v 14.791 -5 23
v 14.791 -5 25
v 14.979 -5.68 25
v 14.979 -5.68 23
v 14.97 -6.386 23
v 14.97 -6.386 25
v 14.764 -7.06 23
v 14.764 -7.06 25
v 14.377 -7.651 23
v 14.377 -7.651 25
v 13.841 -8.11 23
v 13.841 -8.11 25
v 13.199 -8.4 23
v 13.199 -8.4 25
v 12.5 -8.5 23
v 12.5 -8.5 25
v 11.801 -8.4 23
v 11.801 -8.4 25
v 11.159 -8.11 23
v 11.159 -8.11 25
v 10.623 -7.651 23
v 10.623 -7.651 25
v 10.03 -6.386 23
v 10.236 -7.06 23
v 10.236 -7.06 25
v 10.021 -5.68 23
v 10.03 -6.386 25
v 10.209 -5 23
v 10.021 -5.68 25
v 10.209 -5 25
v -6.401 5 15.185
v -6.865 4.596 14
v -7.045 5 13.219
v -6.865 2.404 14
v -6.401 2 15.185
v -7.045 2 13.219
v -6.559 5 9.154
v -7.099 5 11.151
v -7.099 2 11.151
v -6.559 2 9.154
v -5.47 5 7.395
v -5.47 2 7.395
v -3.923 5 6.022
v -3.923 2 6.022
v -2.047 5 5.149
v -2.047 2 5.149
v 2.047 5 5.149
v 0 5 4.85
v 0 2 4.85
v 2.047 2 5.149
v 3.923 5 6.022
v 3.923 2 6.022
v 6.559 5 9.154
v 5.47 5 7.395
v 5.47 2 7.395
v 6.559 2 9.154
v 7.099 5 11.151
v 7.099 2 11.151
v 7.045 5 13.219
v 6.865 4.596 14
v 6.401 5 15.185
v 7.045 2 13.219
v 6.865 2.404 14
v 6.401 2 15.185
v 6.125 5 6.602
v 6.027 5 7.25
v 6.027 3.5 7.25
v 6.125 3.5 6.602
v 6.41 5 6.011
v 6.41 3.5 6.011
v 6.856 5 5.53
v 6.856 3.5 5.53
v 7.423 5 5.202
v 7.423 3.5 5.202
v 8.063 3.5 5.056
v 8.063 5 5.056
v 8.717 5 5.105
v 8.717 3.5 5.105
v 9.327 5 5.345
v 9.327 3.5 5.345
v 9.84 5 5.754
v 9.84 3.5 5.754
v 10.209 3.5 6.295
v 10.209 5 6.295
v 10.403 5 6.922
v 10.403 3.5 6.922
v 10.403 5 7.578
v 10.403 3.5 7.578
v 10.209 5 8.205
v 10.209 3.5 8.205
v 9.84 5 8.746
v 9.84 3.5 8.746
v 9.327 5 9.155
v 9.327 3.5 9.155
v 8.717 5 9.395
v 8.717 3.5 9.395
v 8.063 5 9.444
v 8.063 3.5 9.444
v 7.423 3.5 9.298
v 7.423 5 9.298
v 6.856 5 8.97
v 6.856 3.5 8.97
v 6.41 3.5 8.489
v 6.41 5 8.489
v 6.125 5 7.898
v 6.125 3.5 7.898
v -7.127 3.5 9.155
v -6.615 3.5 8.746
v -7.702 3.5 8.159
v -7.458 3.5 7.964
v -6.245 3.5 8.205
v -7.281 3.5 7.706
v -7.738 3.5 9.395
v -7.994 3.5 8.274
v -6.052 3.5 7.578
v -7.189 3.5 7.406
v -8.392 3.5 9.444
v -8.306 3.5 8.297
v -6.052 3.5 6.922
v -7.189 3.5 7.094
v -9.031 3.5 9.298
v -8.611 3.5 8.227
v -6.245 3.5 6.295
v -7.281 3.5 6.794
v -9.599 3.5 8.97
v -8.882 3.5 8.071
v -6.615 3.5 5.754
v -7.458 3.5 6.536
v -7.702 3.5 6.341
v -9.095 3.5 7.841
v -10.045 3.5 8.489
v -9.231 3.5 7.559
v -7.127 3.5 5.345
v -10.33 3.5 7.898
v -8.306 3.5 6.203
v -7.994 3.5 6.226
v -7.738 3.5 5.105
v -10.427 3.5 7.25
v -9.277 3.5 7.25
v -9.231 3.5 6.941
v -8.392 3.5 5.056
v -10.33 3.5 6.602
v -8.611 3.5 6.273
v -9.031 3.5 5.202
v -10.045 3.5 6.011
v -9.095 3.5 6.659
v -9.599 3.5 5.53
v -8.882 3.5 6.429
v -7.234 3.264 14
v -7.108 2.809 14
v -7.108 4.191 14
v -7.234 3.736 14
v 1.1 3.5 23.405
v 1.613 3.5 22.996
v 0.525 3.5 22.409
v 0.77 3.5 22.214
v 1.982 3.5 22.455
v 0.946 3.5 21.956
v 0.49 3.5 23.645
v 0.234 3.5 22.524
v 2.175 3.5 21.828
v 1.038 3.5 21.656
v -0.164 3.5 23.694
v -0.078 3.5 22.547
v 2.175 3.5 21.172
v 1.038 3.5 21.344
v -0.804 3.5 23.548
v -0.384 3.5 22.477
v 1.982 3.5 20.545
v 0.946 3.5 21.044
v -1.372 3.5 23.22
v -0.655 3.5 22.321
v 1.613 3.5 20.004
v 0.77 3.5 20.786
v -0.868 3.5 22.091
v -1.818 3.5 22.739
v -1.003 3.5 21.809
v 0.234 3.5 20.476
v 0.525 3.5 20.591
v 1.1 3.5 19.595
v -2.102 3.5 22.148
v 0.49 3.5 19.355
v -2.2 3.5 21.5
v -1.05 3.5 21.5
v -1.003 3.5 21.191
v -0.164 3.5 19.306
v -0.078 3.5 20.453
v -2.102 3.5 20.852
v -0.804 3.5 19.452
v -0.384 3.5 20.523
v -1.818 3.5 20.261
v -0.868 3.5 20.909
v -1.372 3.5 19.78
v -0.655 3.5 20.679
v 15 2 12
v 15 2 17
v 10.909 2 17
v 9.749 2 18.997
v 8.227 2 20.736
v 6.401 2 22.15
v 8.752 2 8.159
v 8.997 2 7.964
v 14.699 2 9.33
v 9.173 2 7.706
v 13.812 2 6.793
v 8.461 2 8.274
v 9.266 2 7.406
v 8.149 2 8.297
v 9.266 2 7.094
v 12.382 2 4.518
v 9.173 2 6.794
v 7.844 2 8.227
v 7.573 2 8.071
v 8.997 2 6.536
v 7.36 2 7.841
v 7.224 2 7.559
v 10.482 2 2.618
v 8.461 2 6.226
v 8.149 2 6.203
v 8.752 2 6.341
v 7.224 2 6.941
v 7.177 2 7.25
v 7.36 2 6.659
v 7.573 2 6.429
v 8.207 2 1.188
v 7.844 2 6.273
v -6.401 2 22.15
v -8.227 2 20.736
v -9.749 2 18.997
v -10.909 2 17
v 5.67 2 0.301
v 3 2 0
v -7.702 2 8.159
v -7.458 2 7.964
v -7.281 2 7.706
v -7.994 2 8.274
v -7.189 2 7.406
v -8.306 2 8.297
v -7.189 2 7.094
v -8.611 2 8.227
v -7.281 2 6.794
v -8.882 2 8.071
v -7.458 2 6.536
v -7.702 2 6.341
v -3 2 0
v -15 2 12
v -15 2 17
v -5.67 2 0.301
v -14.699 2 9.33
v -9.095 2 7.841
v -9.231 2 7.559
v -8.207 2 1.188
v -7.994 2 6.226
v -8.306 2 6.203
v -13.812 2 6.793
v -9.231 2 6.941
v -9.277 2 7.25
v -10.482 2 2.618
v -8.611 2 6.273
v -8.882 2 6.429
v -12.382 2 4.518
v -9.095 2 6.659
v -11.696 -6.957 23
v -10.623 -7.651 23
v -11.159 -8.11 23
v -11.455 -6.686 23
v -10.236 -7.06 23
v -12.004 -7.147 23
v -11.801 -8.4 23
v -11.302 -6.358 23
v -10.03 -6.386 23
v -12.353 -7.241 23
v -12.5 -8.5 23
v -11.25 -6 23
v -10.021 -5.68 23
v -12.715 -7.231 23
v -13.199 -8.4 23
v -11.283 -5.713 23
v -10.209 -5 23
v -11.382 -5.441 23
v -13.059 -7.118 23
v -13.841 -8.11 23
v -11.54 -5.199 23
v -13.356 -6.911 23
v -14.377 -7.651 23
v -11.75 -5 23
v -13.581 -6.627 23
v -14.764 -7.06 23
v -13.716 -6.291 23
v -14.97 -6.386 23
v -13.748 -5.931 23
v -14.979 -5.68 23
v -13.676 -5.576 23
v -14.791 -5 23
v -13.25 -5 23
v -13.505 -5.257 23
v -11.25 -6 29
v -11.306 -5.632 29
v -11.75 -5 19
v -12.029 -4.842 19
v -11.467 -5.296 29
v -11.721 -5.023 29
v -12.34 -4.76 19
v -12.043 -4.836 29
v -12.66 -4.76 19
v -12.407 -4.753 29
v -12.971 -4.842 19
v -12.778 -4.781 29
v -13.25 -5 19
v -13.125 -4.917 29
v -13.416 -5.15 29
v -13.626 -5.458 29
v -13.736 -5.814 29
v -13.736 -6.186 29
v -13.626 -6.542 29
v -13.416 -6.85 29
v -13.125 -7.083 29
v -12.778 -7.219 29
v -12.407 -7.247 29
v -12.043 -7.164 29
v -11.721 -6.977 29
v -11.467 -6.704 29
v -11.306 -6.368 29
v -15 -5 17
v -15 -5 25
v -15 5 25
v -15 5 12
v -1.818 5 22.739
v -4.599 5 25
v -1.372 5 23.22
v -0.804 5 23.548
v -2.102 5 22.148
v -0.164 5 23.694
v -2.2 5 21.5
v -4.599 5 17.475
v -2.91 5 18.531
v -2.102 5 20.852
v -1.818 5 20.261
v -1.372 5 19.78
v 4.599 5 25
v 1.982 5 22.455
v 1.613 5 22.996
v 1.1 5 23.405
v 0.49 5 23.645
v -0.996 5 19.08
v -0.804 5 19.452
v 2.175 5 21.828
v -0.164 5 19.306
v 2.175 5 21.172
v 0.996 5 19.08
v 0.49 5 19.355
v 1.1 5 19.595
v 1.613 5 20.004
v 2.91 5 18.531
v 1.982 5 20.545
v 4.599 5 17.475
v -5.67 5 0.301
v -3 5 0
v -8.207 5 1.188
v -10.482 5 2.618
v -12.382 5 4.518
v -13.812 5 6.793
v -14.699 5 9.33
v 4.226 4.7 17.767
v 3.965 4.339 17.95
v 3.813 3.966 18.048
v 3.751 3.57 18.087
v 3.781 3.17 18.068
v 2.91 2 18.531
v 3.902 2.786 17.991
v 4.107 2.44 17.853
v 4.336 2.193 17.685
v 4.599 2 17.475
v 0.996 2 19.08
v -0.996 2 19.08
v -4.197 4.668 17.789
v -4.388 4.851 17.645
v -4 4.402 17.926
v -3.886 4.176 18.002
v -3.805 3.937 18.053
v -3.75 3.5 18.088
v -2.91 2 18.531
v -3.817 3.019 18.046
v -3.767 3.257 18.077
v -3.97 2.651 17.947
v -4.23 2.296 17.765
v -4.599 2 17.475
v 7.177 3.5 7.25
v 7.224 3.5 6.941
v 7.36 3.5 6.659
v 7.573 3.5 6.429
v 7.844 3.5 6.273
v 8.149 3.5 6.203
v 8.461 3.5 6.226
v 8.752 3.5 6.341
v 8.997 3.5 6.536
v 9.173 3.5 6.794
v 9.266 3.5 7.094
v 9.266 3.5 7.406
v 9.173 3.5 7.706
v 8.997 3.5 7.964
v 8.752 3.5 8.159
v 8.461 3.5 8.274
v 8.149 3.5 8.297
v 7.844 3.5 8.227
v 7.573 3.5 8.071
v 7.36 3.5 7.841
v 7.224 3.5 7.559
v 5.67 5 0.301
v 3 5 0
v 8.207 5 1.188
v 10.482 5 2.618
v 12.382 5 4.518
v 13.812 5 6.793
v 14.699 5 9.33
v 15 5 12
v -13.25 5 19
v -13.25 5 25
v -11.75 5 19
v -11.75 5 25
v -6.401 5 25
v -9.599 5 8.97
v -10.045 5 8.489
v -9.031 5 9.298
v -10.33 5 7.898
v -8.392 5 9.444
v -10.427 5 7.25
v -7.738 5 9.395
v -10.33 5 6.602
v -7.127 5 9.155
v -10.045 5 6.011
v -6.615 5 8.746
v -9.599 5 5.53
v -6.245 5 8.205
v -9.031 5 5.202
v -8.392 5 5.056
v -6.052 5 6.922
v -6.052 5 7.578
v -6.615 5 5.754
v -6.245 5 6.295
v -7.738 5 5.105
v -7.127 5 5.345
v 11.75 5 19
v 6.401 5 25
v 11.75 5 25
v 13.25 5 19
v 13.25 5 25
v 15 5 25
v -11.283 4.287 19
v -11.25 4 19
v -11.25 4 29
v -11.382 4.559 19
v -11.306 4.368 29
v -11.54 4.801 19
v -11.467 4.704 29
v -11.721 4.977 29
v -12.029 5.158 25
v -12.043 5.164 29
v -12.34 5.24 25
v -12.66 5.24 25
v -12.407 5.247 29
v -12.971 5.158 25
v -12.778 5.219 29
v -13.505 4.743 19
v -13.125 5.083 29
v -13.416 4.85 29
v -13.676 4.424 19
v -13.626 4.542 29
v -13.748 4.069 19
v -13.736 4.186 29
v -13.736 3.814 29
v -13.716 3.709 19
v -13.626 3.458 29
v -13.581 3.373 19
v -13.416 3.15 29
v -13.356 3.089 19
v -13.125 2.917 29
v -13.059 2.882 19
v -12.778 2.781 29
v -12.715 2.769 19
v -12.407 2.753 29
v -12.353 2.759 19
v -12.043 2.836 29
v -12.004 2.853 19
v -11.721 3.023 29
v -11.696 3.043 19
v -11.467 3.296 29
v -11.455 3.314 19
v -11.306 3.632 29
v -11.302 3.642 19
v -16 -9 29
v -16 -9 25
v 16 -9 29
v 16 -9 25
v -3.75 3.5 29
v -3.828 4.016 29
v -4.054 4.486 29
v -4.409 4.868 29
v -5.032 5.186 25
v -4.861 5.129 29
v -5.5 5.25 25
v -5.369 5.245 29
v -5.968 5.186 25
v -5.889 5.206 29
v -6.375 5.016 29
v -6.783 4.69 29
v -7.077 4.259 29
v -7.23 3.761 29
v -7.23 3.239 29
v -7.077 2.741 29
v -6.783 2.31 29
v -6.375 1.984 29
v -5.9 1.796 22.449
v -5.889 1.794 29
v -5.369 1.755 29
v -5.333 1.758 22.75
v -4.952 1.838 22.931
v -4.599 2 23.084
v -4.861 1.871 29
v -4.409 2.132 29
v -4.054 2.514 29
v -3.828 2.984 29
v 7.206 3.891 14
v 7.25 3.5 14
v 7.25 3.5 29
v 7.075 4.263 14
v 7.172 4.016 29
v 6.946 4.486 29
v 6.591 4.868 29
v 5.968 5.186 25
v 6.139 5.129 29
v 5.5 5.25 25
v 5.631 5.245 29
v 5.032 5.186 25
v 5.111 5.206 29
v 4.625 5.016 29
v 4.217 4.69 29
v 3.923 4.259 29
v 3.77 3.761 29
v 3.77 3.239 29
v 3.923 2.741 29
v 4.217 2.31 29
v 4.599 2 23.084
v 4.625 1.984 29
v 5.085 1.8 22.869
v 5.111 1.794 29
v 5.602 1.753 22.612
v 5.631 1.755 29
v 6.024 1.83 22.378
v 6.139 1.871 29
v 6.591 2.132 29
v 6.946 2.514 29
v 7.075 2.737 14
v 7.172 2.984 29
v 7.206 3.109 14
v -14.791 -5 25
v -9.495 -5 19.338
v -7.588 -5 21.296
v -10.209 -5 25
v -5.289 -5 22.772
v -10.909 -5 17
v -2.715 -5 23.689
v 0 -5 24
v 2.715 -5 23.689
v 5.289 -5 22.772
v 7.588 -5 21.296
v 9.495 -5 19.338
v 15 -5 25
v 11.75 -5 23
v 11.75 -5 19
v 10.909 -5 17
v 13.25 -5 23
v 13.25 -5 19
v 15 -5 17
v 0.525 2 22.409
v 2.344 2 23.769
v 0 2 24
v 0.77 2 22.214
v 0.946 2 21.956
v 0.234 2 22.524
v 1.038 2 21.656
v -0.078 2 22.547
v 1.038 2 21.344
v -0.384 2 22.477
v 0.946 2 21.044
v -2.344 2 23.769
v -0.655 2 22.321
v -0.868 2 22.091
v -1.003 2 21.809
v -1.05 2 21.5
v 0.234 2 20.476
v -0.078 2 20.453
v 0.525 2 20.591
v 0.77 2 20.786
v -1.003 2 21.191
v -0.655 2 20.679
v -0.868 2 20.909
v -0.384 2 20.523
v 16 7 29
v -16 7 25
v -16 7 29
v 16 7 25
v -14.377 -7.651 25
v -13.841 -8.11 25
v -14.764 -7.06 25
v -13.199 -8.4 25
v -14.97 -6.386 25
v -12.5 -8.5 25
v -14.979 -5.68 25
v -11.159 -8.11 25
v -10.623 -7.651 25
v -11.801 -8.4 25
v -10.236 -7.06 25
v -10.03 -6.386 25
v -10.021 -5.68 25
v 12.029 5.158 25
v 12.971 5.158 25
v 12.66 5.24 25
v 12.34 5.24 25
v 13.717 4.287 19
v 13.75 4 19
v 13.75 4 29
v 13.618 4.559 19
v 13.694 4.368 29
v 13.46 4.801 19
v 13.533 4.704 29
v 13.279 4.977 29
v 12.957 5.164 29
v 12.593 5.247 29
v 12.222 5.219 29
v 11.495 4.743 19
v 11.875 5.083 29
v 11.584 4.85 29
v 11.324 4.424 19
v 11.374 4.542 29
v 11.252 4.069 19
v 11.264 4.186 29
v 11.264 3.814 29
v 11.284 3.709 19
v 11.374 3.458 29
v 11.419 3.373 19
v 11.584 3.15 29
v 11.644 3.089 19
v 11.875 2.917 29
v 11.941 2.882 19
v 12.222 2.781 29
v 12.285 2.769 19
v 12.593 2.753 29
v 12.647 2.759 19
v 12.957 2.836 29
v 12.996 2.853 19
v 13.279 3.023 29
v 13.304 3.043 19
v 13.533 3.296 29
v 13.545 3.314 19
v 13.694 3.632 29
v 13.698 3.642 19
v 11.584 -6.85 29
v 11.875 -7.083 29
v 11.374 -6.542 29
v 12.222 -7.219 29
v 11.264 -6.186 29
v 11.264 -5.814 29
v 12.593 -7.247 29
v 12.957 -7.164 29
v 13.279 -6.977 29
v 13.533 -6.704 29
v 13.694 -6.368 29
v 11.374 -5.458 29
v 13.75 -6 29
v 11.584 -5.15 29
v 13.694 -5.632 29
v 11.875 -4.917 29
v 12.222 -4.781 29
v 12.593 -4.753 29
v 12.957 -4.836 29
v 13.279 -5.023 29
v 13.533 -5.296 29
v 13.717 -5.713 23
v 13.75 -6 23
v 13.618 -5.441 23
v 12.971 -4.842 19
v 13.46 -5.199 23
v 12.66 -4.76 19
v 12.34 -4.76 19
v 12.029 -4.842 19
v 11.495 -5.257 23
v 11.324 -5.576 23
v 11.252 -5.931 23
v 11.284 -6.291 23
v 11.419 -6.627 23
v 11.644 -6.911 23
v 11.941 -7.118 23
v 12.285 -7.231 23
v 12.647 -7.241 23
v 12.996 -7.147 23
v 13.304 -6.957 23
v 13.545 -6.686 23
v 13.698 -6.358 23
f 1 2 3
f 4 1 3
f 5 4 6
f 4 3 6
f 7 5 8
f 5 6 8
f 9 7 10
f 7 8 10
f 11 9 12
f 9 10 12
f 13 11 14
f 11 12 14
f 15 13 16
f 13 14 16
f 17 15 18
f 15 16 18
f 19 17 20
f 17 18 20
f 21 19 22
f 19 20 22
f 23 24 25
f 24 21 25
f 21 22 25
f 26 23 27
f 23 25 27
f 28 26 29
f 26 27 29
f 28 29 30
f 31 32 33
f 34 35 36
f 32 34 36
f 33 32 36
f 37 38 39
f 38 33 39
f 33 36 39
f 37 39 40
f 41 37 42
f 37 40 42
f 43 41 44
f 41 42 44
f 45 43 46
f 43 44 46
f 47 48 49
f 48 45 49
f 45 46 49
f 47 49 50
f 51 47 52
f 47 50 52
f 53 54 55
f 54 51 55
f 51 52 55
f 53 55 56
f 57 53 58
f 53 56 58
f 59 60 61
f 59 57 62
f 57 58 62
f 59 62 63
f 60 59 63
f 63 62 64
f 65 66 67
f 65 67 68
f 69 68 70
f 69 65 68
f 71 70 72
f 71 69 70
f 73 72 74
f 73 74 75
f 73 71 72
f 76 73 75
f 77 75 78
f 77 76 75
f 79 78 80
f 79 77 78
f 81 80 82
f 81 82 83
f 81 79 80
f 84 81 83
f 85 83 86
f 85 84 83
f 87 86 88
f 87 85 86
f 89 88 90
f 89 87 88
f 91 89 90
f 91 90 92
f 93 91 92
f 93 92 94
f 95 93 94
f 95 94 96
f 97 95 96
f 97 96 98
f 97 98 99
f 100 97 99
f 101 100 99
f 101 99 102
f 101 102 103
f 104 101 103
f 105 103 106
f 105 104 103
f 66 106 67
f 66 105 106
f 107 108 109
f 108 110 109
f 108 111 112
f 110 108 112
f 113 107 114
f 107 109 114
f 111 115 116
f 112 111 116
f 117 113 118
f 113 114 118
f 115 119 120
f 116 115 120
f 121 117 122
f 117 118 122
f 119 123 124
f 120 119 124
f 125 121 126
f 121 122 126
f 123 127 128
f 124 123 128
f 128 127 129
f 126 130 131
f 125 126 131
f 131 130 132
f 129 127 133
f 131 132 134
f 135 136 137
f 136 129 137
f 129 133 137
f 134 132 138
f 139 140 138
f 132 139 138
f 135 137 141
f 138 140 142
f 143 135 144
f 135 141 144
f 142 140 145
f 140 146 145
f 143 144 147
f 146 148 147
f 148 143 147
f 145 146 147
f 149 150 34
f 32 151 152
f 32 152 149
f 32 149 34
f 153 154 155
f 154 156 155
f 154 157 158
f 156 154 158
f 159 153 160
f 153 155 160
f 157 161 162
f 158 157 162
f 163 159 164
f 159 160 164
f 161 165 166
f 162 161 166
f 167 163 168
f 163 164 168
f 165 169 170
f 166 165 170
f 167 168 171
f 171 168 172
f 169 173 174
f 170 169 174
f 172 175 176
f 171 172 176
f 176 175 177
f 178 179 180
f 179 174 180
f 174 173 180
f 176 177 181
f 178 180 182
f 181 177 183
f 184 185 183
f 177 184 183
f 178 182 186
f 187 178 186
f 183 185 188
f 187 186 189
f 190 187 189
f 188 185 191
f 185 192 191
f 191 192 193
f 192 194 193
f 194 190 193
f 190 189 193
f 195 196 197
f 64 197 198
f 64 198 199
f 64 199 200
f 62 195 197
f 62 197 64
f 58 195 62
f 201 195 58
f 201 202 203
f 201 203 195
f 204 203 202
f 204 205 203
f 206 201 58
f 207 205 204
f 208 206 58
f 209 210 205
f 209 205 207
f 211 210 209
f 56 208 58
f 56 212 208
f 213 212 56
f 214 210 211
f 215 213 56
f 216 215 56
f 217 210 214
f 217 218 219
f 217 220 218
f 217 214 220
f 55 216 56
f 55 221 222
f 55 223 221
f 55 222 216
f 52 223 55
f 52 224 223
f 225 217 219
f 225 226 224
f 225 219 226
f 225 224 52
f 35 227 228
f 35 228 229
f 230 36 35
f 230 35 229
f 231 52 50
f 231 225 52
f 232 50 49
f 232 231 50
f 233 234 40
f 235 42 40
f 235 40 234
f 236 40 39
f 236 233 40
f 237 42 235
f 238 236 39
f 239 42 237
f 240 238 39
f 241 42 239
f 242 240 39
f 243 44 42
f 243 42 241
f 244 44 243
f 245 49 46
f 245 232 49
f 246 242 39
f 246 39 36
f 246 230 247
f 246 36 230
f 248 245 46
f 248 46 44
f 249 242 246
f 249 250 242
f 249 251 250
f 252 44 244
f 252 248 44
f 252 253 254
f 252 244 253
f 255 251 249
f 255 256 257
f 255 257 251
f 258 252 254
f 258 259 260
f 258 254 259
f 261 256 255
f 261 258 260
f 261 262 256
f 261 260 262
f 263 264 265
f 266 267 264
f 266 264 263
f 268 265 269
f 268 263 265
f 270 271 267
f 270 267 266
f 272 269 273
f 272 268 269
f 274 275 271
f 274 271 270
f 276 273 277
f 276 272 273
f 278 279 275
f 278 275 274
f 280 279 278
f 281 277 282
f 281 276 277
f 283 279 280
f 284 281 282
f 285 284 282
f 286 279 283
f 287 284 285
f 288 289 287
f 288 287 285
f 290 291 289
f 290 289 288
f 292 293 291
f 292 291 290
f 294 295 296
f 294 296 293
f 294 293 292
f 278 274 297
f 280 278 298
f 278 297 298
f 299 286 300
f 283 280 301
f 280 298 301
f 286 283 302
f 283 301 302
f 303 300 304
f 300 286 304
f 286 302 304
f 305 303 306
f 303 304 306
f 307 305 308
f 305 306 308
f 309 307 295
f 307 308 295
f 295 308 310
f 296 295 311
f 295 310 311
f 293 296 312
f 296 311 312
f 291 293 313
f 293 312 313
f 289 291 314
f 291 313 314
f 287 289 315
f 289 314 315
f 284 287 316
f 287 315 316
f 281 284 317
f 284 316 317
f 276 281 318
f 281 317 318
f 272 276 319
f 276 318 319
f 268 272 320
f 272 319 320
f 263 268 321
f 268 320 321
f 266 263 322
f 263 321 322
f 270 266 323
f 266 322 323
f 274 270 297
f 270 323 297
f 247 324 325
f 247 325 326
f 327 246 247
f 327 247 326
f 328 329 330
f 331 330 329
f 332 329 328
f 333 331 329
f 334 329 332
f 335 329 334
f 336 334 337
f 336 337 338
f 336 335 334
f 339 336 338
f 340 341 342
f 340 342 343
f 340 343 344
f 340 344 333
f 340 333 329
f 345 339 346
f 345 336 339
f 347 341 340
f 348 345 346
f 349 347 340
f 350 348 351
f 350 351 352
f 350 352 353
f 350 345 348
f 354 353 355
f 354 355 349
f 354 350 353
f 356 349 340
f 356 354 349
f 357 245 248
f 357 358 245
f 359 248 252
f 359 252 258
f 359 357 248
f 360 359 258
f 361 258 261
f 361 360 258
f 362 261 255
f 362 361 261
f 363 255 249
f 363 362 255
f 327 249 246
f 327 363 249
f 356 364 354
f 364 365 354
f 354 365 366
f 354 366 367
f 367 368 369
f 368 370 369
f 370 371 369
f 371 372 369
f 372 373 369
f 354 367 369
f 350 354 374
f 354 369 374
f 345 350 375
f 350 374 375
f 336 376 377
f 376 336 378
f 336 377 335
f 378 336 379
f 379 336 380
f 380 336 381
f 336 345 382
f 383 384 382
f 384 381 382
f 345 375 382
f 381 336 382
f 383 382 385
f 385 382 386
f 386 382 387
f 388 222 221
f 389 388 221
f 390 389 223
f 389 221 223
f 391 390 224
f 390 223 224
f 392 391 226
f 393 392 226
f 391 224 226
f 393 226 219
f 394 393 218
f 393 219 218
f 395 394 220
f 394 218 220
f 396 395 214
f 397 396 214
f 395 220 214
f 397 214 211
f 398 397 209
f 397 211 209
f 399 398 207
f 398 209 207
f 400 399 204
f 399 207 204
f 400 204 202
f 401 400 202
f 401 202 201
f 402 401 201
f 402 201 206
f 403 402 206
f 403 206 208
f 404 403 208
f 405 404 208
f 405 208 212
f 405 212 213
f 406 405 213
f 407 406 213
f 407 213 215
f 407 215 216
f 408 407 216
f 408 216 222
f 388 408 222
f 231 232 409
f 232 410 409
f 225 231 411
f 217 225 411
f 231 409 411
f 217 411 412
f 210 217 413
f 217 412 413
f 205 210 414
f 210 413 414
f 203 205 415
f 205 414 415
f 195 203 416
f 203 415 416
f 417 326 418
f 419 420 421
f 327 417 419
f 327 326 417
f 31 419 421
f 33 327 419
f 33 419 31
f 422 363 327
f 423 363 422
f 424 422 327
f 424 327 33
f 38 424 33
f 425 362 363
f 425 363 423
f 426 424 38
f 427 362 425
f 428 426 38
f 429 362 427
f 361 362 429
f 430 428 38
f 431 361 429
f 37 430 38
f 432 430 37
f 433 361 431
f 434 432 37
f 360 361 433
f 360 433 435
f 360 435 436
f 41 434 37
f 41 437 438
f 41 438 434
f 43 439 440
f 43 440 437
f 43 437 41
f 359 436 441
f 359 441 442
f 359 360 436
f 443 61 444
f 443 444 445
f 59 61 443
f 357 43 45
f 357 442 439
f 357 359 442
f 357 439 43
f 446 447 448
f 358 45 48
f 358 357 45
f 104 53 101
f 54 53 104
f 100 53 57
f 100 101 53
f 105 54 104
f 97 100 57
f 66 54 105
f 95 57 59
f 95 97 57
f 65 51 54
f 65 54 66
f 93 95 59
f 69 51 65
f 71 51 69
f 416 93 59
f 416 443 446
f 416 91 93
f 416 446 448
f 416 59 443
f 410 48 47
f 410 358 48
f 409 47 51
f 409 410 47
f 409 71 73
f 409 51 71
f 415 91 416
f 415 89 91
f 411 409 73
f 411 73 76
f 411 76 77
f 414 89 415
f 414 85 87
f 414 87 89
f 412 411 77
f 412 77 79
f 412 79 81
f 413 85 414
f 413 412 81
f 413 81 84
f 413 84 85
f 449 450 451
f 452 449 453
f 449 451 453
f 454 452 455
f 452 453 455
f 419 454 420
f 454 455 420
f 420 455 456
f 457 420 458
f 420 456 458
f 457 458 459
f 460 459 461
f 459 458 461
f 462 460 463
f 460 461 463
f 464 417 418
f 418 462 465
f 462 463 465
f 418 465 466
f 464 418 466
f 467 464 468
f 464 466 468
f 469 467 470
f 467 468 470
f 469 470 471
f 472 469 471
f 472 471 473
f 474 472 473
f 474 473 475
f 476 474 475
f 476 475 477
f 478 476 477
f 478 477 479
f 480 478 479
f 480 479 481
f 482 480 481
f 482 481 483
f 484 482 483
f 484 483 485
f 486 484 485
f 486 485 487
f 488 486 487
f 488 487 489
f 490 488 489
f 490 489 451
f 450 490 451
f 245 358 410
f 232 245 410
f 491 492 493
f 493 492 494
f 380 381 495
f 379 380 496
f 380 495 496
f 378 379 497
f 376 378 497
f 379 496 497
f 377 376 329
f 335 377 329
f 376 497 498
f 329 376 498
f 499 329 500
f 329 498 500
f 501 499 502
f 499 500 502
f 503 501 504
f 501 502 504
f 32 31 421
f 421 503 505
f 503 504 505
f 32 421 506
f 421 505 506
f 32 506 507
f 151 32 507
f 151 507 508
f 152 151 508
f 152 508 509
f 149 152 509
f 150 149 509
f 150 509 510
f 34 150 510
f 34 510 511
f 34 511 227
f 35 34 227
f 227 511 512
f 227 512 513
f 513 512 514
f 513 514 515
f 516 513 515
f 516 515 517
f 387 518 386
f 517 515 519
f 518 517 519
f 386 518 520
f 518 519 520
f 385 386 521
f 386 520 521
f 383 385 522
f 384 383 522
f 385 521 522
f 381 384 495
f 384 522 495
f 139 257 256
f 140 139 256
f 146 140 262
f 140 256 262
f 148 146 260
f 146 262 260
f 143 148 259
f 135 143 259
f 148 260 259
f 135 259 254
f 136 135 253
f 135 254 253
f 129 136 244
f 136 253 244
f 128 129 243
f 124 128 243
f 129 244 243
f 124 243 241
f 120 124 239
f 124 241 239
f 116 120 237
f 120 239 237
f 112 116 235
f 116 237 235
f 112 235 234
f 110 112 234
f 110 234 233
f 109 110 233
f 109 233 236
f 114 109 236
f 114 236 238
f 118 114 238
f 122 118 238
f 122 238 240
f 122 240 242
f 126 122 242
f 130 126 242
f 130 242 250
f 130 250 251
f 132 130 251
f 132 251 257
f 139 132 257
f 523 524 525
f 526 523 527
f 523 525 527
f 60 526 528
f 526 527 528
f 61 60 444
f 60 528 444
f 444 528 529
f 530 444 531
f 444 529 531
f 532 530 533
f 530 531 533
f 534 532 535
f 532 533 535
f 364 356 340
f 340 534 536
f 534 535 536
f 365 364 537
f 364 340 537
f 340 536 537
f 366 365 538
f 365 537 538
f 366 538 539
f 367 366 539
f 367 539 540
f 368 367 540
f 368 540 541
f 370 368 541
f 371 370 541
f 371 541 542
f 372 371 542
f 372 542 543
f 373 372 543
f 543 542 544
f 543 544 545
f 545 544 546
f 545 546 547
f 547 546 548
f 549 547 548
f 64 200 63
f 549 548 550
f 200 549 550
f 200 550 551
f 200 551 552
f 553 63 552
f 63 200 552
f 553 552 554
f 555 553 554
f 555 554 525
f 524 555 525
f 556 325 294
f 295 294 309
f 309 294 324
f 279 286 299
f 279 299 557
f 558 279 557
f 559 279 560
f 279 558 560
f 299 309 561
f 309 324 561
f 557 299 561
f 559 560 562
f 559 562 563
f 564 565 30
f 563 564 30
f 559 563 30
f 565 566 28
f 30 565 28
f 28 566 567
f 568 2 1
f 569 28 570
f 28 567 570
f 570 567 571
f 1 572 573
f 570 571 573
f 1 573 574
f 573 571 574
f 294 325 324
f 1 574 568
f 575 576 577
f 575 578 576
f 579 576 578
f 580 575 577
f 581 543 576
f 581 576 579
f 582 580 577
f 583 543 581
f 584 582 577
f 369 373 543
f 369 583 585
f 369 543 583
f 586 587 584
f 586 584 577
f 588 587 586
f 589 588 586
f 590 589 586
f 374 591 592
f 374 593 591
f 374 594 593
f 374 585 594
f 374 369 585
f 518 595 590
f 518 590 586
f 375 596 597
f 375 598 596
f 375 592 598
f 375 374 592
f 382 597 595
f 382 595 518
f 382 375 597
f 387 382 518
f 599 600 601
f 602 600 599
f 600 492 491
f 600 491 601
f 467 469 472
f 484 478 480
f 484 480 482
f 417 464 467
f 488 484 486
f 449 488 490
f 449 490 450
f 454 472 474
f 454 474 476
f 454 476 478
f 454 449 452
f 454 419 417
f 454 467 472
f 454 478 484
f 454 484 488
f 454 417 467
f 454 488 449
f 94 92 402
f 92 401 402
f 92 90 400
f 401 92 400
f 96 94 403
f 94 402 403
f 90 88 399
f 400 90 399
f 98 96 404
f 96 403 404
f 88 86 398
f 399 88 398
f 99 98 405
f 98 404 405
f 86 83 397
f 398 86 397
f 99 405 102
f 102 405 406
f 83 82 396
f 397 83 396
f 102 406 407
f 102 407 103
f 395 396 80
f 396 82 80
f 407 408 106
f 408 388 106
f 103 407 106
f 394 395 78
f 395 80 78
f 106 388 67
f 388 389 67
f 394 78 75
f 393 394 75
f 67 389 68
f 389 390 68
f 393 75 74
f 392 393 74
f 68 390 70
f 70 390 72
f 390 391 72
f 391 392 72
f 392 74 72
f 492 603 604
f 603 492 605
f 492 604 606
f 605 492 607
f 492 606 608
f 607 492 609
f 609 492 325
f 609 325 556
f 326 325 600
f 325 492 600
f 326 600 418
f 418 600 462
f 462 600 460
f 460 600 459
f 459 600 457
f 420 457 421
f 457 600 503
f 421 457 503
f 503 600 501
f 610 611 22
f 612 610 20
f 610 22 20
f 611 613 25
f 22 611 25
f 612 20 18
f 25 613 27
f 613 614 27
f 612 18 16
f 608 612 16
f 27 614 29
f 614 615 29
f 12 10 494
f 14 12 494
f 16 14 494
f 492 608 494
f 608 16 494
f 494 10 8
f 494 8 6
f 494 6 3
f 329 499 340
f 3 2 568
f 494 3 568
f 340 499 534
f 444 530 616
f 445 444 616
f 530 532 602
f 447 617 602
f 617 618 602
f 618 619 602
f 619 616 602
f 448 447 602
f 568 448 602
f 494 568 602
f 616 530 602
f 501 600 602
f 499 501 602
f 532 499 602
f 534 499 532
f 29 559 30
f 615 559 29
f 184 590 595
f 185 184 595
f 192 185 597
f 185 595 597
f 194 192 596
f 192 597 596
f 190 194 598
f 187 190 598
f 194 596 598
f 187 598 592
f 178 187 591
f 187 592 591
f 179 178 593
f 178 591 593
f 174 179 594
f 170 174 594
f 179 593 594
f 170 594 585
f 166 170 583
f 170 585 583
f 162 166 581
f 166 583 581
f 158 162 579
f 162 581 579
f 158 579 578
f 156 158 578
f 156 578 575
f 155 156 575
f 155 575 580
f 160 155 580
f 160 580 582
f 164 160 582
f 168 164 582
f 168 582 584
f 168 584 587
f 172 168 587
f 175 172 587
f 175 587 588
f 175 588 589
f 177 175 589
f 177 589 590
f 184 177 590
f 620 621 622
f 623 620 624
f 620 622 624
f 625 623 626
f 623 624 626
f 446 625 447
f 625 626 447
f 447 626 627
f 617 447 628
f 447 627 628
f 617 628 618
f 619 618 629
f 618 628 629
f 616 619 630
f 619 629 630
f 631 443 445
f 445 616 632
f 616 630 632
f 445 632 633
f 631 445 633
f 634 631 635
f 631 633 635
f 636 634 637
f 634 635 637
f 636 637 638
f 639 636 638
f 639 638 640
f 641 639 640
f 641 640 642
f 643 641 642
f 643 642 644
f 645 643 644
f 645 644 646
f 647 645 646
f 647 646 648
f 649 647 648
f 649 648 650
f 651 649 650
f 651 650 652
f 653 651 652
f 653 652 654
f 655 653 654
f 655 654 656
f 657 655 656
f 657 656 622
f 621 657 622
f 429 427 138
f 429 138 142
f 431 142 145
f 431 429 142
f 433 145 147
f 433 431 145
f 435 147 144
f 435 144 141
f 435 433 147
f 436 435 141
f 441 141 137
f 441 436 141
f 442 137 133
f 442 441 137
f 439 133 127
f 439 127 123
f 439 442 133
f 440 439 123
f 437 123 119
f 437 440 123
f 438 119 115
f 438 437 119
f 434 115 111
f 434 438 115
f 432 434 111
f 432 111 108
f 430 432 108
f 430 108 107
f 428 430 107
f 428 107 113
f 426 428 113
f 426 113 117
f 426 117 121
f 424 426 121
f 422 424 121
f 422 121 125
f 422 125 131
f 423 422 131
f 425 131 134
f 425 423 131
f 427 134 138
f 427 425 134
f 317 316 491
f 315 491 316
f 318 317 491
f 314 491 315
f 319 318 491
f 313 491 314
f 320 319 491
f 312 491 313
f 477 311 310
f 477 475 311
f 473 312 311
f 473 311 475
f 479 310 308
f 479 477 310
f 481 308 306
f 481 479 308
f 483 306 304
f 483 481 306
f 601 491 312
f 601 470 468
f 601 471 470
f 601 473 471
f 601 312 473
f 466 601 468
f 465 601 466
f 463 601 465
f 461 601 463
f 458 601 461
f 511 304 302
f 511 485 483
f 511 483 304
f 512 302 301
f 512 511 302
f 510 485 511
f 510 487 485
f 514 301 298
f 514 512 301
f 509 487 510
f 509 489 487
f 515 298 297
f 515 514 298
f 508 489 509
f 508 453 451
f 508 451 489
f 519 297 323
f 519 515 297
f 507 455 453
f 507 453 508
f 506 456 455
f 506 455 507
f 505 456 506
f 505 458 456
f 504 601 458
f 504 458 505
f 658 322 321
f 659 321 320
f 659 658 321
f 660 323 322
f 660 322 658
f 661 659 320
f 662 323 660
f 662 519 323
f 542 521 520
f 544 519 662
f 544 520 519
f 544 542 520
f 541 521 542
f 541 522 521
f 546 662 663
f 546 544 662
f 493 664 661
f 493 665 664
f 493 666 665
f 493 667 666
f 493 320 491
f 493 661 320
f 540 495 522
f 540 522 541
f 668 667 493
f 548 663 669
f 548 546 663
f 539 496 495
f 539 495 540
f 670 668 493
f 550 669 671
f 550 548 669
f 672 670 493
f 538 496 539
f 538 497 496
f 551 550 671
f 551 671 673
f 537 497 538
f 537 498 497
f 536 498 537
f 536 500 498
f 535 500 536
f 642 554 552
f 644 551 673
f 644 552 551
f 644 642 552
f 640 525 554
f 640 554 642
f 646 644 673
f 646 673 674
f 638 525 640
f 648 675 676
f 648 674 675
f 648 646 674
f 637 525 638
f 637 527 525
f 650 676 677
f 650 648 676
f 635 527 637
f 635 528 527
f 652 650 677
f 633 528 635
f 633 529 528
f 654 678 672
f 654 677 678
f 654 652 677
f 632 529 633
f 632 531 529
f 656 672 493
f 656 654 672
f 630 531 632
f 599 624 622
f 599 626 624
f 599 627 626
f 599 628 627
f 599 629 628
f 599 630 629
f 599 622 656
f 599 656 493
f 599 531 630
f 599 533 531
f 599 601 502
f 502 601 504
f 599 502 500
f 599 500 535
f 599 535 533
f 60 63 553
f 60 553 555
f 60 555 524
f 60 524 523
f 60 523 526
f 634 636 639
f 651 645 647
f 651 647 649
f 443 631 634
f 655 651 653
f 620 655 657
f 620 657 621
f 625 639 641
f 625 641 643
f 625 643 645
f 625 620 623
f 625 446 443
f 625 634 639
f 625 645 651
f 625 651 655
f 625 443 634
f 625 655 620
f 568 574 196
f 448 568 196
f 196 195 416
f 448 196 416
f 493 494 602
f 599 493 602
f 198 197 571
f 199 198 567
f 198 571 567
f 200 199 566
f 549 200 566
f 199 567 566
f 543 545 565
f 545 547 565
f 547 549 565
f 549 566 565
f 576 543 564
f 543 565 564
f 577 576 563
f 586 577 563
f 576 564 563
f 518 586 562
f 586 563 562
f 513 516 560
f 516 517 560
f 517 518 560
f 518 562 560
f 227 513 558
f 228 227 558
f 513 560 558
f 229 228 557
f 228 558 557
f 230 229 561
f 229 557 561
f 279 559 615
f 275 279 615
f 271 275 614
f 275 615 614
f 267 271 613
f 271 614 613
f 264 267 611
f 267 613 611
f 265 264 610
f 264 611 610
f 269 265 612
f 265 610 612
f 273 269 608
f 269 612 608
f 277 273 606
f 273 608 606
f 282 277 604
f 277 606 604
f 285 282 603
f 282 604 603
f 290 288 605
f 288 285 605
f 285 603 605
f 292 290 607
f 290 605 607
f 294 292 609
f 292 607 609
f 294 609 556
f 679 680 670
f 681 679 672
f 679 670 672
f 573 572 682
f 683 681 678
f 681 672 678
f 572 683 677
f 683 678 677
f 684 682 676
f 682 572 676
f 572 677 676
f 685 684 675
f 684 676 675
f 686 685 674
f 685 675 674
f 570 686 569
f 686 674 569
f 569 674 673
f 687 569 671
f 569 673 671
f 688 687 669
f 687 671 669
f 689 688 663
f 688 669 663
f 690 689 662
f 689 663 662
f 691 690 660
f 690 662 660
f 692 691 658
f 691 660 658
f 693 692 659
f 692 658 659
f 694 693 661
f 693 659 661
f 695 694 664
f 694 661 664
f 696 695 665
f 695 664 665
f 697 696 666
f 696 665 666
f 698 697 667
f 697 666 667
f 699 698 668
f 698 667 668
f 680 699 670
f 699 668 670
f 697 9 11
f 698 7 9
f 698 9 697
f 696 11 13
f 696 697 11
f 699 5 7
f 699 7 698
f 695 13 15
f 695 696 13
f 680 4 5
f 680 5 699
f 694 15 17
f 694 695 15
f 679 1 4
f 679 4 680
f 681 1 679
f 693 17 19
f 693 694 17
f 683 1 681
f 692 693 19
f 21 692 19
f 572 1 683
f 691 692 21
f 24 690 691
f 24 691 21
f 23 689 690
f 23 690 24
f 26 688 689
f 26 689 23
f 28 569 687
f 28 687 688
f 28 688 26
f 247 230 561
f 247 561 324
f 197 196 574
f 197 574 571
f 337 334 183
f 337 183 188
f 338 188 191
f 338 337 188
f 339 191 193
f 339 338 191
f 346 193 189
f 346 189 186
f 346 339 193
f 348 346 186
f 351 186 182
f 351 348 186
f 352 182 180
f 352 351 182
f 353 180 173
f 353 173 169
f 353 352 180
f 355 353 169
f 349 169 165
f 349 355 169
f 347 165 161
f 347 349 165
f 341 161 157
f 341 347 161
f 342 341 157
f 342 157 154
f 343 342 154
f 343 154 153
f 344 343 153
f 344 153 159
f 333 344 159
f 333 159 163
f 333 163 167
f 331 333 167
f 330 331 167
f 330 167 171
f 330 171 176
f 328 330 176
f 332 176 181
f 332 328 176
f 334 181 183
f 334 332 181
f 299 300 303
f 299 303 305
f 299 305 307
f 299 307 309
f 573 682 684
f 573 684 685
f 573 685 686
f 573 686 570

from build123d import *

# Parameters (mm, degrees)
SKETCH1_W                = 30
SKETCH1_H                = 10
MAIN_DEPTH               = 25
SKETCH5_R                = 1.05
SKETCH5_R_2              = 7.15
MAINANDFIXHOLE_DEPTH     = 11
SKETCH6_R                = 2.2
CODERFIXHOLE2_DEPTH      = 1.5
CODERHOLE2_DEPTH         = 7
SKETCH10_W               = 32
SKETCH10_H               = 16
LINK_DEPTH               = 4
SKETCH8_R                = 1.25
VERTICALHOLES_DEPTH      = 10
HOLELPATTERN1_COUNT      = 2
HOLELPATTERN1_PITCH      = 25
HOLELPATTERN1_COUNT_DIR2 = 2
HOLELPATTERN1_PITCH_DIR2 = 10
SKETCH13_R               = 2.5
LINKREINFORCEMENT_DEPTH  = 2
FILLET6_R                = 12
SKETCH14_R               = 1.25
FIXHOLE_DEPTH            = 10
SKETCH16_R               = 1.75
HEXAKEYACCESSHOLE_DEPTH  = 15


with BuildPart() as part:
    # Sketch1 → Main (new body)
    with BuildSketch(Plane.XY):
        Rectangle(SKETCH1_W, SKETCH1_H)
    extrude(amount=MAIN_DEPTH)

    # Sketch5 → MainAndFixHole (cut, through all)
    with BuildSketch(Plane(origin=(0, -5, 0), x_dir=(-1, 0, 0), z_dir=(0, -1, 0))):
        with Locations((0, -21.5)):
            Circle(SKETCH5_R)
        with Locations((-8.227241336, -7.25)):
            Circle(SKETCH5_R)
        with Locations((8.227241336, -7.25)):
            Circle(SKETCH5_R)
        with Locations((0, -12)):
            Circle(SKETCH5_R_2)
    extrude(amount=-MAINANDFIXHOLE_DEPTH, mode=Mode.SUBTRACT)

    # Sketch6 → CoderFixHole2 (cut)
    with BuildSketch(Plane(origin=(0, 5, 0), x_dir=(-1, 0, 0), z_dir=(0, -1, 0))):
        with Locations((0, -21.5)):
            Circle(SKETCH6_R)
        with Locations((-8.227241336, -7.25)):
            Circle(SKETCH6_R)
        with Locations((8.227241336, -7.25)):
            Circle(SKETCH6_R)
    extrude(amount=CODERFIXHOLE2_DEPTH, mode=Mode.SUBTRACT)

    # Sketch11 → CoderHole2 (cut)
    with BuildSketch(Plane(origin=(0, -5, 0), x_dir=(1, 0, 0), z_dir=(0, 1, 0))):
        with BuildLine():
            Line((-15, 0), (15, 0))
            Line((15, 0), (15, -17))
            Line((15, -17), (10.908712115, -17))
            ThreePointArc((10.908712115, -17), (0, -24), (-10.908712115, -17))
            Line((-10.908712115, -17), (-15, -17))
            Line((-15, -17), (-15, 0))
        make_face()
    extrude(amount=CODERHOLE2_DEPTH, mode=Mode.SUBTRACT)

    # Sketch10 → Link (add)
    with BuildSketch(Plane.XY.offset(25)):
        with Locations((0, -1)):
            Rectangle(SKETCH10_W, SKETCH10_H)
    extrude(amount=LINK_DEPTH)

    # Sketch8 → VerticalHoles (cut)
    with BuildSketch(Plane.XY.offset(29)):
        with Locations((12.5, 4)):
            Circle(SKETCH8_R)
    verticalholes = extrude(amount=-VERTICALHOLES_DEPTH, mode=Mode.SUBTRACT)

    # HoleLPattern1: VerticalHoles 2 × 2
    with Locations(*[(-i * HOLELPATTERN1_PITCH, -j * HOLELPATTERN1_PITCH_DIR2, 0) for i in range(HOLELPATTERN1_COUNT) for j in range(HOLELPATTERN1_COUNT_DIR2) if (i, j) != (0, 0)]):
        add(verticalholes, mode=Mode.SUBTRACT)

    # Sketch13 → LinkReinforcement (add)
    with BuildSketch(Plane(origin=(0, 0, 25), x_dir=(-1, 0, 0), z_dir=(0, 0, -1))):
        with Locations((-12.5, -6)):
            Circle(SKETCH13_R)
        with Locations((12.5, -6)):
            Circle(SKETCH13_R)
    extrude(amount=LINKREINFORCEMENT_DEPTH)

    # Fillet6
    fillet6_edges = [part.edges().sort_by_distance(p)[0] for p in [
        (-15, 3.5, 0),
        (15, 3.5, 0),
    ]]
    fillet(fillet6_edges, radius=FILLET6_R)

    # Sketch14 → FixHole (cut)
    with BuildSketch(Plane.XY.offset(29)):
        with Locations((-12.5, -6)):
            Circle(SKETCH14_R)
        with Locations((12.5, -6)):
            Circle(SKETCH14_R)
    extrude(amount=-FIXHOLE_DEPTH, mode=Mode.SUBTRACT)

    # Sketch16 → HexaKeyAccessHole (cut)
    with BuildSketch(Plane.XY.offset(29)):
        with Locations((-5.5, 3.5)):
            Circle(SKETCH16_R)
        with Locations((5.5, 3.5)):
            Circle(SKETCH16_R)
    extrude(amount=-HEXAKEYACCESSHOLE_DEPTH, mode=Mode.SUBTRACT)


solid = part.part
